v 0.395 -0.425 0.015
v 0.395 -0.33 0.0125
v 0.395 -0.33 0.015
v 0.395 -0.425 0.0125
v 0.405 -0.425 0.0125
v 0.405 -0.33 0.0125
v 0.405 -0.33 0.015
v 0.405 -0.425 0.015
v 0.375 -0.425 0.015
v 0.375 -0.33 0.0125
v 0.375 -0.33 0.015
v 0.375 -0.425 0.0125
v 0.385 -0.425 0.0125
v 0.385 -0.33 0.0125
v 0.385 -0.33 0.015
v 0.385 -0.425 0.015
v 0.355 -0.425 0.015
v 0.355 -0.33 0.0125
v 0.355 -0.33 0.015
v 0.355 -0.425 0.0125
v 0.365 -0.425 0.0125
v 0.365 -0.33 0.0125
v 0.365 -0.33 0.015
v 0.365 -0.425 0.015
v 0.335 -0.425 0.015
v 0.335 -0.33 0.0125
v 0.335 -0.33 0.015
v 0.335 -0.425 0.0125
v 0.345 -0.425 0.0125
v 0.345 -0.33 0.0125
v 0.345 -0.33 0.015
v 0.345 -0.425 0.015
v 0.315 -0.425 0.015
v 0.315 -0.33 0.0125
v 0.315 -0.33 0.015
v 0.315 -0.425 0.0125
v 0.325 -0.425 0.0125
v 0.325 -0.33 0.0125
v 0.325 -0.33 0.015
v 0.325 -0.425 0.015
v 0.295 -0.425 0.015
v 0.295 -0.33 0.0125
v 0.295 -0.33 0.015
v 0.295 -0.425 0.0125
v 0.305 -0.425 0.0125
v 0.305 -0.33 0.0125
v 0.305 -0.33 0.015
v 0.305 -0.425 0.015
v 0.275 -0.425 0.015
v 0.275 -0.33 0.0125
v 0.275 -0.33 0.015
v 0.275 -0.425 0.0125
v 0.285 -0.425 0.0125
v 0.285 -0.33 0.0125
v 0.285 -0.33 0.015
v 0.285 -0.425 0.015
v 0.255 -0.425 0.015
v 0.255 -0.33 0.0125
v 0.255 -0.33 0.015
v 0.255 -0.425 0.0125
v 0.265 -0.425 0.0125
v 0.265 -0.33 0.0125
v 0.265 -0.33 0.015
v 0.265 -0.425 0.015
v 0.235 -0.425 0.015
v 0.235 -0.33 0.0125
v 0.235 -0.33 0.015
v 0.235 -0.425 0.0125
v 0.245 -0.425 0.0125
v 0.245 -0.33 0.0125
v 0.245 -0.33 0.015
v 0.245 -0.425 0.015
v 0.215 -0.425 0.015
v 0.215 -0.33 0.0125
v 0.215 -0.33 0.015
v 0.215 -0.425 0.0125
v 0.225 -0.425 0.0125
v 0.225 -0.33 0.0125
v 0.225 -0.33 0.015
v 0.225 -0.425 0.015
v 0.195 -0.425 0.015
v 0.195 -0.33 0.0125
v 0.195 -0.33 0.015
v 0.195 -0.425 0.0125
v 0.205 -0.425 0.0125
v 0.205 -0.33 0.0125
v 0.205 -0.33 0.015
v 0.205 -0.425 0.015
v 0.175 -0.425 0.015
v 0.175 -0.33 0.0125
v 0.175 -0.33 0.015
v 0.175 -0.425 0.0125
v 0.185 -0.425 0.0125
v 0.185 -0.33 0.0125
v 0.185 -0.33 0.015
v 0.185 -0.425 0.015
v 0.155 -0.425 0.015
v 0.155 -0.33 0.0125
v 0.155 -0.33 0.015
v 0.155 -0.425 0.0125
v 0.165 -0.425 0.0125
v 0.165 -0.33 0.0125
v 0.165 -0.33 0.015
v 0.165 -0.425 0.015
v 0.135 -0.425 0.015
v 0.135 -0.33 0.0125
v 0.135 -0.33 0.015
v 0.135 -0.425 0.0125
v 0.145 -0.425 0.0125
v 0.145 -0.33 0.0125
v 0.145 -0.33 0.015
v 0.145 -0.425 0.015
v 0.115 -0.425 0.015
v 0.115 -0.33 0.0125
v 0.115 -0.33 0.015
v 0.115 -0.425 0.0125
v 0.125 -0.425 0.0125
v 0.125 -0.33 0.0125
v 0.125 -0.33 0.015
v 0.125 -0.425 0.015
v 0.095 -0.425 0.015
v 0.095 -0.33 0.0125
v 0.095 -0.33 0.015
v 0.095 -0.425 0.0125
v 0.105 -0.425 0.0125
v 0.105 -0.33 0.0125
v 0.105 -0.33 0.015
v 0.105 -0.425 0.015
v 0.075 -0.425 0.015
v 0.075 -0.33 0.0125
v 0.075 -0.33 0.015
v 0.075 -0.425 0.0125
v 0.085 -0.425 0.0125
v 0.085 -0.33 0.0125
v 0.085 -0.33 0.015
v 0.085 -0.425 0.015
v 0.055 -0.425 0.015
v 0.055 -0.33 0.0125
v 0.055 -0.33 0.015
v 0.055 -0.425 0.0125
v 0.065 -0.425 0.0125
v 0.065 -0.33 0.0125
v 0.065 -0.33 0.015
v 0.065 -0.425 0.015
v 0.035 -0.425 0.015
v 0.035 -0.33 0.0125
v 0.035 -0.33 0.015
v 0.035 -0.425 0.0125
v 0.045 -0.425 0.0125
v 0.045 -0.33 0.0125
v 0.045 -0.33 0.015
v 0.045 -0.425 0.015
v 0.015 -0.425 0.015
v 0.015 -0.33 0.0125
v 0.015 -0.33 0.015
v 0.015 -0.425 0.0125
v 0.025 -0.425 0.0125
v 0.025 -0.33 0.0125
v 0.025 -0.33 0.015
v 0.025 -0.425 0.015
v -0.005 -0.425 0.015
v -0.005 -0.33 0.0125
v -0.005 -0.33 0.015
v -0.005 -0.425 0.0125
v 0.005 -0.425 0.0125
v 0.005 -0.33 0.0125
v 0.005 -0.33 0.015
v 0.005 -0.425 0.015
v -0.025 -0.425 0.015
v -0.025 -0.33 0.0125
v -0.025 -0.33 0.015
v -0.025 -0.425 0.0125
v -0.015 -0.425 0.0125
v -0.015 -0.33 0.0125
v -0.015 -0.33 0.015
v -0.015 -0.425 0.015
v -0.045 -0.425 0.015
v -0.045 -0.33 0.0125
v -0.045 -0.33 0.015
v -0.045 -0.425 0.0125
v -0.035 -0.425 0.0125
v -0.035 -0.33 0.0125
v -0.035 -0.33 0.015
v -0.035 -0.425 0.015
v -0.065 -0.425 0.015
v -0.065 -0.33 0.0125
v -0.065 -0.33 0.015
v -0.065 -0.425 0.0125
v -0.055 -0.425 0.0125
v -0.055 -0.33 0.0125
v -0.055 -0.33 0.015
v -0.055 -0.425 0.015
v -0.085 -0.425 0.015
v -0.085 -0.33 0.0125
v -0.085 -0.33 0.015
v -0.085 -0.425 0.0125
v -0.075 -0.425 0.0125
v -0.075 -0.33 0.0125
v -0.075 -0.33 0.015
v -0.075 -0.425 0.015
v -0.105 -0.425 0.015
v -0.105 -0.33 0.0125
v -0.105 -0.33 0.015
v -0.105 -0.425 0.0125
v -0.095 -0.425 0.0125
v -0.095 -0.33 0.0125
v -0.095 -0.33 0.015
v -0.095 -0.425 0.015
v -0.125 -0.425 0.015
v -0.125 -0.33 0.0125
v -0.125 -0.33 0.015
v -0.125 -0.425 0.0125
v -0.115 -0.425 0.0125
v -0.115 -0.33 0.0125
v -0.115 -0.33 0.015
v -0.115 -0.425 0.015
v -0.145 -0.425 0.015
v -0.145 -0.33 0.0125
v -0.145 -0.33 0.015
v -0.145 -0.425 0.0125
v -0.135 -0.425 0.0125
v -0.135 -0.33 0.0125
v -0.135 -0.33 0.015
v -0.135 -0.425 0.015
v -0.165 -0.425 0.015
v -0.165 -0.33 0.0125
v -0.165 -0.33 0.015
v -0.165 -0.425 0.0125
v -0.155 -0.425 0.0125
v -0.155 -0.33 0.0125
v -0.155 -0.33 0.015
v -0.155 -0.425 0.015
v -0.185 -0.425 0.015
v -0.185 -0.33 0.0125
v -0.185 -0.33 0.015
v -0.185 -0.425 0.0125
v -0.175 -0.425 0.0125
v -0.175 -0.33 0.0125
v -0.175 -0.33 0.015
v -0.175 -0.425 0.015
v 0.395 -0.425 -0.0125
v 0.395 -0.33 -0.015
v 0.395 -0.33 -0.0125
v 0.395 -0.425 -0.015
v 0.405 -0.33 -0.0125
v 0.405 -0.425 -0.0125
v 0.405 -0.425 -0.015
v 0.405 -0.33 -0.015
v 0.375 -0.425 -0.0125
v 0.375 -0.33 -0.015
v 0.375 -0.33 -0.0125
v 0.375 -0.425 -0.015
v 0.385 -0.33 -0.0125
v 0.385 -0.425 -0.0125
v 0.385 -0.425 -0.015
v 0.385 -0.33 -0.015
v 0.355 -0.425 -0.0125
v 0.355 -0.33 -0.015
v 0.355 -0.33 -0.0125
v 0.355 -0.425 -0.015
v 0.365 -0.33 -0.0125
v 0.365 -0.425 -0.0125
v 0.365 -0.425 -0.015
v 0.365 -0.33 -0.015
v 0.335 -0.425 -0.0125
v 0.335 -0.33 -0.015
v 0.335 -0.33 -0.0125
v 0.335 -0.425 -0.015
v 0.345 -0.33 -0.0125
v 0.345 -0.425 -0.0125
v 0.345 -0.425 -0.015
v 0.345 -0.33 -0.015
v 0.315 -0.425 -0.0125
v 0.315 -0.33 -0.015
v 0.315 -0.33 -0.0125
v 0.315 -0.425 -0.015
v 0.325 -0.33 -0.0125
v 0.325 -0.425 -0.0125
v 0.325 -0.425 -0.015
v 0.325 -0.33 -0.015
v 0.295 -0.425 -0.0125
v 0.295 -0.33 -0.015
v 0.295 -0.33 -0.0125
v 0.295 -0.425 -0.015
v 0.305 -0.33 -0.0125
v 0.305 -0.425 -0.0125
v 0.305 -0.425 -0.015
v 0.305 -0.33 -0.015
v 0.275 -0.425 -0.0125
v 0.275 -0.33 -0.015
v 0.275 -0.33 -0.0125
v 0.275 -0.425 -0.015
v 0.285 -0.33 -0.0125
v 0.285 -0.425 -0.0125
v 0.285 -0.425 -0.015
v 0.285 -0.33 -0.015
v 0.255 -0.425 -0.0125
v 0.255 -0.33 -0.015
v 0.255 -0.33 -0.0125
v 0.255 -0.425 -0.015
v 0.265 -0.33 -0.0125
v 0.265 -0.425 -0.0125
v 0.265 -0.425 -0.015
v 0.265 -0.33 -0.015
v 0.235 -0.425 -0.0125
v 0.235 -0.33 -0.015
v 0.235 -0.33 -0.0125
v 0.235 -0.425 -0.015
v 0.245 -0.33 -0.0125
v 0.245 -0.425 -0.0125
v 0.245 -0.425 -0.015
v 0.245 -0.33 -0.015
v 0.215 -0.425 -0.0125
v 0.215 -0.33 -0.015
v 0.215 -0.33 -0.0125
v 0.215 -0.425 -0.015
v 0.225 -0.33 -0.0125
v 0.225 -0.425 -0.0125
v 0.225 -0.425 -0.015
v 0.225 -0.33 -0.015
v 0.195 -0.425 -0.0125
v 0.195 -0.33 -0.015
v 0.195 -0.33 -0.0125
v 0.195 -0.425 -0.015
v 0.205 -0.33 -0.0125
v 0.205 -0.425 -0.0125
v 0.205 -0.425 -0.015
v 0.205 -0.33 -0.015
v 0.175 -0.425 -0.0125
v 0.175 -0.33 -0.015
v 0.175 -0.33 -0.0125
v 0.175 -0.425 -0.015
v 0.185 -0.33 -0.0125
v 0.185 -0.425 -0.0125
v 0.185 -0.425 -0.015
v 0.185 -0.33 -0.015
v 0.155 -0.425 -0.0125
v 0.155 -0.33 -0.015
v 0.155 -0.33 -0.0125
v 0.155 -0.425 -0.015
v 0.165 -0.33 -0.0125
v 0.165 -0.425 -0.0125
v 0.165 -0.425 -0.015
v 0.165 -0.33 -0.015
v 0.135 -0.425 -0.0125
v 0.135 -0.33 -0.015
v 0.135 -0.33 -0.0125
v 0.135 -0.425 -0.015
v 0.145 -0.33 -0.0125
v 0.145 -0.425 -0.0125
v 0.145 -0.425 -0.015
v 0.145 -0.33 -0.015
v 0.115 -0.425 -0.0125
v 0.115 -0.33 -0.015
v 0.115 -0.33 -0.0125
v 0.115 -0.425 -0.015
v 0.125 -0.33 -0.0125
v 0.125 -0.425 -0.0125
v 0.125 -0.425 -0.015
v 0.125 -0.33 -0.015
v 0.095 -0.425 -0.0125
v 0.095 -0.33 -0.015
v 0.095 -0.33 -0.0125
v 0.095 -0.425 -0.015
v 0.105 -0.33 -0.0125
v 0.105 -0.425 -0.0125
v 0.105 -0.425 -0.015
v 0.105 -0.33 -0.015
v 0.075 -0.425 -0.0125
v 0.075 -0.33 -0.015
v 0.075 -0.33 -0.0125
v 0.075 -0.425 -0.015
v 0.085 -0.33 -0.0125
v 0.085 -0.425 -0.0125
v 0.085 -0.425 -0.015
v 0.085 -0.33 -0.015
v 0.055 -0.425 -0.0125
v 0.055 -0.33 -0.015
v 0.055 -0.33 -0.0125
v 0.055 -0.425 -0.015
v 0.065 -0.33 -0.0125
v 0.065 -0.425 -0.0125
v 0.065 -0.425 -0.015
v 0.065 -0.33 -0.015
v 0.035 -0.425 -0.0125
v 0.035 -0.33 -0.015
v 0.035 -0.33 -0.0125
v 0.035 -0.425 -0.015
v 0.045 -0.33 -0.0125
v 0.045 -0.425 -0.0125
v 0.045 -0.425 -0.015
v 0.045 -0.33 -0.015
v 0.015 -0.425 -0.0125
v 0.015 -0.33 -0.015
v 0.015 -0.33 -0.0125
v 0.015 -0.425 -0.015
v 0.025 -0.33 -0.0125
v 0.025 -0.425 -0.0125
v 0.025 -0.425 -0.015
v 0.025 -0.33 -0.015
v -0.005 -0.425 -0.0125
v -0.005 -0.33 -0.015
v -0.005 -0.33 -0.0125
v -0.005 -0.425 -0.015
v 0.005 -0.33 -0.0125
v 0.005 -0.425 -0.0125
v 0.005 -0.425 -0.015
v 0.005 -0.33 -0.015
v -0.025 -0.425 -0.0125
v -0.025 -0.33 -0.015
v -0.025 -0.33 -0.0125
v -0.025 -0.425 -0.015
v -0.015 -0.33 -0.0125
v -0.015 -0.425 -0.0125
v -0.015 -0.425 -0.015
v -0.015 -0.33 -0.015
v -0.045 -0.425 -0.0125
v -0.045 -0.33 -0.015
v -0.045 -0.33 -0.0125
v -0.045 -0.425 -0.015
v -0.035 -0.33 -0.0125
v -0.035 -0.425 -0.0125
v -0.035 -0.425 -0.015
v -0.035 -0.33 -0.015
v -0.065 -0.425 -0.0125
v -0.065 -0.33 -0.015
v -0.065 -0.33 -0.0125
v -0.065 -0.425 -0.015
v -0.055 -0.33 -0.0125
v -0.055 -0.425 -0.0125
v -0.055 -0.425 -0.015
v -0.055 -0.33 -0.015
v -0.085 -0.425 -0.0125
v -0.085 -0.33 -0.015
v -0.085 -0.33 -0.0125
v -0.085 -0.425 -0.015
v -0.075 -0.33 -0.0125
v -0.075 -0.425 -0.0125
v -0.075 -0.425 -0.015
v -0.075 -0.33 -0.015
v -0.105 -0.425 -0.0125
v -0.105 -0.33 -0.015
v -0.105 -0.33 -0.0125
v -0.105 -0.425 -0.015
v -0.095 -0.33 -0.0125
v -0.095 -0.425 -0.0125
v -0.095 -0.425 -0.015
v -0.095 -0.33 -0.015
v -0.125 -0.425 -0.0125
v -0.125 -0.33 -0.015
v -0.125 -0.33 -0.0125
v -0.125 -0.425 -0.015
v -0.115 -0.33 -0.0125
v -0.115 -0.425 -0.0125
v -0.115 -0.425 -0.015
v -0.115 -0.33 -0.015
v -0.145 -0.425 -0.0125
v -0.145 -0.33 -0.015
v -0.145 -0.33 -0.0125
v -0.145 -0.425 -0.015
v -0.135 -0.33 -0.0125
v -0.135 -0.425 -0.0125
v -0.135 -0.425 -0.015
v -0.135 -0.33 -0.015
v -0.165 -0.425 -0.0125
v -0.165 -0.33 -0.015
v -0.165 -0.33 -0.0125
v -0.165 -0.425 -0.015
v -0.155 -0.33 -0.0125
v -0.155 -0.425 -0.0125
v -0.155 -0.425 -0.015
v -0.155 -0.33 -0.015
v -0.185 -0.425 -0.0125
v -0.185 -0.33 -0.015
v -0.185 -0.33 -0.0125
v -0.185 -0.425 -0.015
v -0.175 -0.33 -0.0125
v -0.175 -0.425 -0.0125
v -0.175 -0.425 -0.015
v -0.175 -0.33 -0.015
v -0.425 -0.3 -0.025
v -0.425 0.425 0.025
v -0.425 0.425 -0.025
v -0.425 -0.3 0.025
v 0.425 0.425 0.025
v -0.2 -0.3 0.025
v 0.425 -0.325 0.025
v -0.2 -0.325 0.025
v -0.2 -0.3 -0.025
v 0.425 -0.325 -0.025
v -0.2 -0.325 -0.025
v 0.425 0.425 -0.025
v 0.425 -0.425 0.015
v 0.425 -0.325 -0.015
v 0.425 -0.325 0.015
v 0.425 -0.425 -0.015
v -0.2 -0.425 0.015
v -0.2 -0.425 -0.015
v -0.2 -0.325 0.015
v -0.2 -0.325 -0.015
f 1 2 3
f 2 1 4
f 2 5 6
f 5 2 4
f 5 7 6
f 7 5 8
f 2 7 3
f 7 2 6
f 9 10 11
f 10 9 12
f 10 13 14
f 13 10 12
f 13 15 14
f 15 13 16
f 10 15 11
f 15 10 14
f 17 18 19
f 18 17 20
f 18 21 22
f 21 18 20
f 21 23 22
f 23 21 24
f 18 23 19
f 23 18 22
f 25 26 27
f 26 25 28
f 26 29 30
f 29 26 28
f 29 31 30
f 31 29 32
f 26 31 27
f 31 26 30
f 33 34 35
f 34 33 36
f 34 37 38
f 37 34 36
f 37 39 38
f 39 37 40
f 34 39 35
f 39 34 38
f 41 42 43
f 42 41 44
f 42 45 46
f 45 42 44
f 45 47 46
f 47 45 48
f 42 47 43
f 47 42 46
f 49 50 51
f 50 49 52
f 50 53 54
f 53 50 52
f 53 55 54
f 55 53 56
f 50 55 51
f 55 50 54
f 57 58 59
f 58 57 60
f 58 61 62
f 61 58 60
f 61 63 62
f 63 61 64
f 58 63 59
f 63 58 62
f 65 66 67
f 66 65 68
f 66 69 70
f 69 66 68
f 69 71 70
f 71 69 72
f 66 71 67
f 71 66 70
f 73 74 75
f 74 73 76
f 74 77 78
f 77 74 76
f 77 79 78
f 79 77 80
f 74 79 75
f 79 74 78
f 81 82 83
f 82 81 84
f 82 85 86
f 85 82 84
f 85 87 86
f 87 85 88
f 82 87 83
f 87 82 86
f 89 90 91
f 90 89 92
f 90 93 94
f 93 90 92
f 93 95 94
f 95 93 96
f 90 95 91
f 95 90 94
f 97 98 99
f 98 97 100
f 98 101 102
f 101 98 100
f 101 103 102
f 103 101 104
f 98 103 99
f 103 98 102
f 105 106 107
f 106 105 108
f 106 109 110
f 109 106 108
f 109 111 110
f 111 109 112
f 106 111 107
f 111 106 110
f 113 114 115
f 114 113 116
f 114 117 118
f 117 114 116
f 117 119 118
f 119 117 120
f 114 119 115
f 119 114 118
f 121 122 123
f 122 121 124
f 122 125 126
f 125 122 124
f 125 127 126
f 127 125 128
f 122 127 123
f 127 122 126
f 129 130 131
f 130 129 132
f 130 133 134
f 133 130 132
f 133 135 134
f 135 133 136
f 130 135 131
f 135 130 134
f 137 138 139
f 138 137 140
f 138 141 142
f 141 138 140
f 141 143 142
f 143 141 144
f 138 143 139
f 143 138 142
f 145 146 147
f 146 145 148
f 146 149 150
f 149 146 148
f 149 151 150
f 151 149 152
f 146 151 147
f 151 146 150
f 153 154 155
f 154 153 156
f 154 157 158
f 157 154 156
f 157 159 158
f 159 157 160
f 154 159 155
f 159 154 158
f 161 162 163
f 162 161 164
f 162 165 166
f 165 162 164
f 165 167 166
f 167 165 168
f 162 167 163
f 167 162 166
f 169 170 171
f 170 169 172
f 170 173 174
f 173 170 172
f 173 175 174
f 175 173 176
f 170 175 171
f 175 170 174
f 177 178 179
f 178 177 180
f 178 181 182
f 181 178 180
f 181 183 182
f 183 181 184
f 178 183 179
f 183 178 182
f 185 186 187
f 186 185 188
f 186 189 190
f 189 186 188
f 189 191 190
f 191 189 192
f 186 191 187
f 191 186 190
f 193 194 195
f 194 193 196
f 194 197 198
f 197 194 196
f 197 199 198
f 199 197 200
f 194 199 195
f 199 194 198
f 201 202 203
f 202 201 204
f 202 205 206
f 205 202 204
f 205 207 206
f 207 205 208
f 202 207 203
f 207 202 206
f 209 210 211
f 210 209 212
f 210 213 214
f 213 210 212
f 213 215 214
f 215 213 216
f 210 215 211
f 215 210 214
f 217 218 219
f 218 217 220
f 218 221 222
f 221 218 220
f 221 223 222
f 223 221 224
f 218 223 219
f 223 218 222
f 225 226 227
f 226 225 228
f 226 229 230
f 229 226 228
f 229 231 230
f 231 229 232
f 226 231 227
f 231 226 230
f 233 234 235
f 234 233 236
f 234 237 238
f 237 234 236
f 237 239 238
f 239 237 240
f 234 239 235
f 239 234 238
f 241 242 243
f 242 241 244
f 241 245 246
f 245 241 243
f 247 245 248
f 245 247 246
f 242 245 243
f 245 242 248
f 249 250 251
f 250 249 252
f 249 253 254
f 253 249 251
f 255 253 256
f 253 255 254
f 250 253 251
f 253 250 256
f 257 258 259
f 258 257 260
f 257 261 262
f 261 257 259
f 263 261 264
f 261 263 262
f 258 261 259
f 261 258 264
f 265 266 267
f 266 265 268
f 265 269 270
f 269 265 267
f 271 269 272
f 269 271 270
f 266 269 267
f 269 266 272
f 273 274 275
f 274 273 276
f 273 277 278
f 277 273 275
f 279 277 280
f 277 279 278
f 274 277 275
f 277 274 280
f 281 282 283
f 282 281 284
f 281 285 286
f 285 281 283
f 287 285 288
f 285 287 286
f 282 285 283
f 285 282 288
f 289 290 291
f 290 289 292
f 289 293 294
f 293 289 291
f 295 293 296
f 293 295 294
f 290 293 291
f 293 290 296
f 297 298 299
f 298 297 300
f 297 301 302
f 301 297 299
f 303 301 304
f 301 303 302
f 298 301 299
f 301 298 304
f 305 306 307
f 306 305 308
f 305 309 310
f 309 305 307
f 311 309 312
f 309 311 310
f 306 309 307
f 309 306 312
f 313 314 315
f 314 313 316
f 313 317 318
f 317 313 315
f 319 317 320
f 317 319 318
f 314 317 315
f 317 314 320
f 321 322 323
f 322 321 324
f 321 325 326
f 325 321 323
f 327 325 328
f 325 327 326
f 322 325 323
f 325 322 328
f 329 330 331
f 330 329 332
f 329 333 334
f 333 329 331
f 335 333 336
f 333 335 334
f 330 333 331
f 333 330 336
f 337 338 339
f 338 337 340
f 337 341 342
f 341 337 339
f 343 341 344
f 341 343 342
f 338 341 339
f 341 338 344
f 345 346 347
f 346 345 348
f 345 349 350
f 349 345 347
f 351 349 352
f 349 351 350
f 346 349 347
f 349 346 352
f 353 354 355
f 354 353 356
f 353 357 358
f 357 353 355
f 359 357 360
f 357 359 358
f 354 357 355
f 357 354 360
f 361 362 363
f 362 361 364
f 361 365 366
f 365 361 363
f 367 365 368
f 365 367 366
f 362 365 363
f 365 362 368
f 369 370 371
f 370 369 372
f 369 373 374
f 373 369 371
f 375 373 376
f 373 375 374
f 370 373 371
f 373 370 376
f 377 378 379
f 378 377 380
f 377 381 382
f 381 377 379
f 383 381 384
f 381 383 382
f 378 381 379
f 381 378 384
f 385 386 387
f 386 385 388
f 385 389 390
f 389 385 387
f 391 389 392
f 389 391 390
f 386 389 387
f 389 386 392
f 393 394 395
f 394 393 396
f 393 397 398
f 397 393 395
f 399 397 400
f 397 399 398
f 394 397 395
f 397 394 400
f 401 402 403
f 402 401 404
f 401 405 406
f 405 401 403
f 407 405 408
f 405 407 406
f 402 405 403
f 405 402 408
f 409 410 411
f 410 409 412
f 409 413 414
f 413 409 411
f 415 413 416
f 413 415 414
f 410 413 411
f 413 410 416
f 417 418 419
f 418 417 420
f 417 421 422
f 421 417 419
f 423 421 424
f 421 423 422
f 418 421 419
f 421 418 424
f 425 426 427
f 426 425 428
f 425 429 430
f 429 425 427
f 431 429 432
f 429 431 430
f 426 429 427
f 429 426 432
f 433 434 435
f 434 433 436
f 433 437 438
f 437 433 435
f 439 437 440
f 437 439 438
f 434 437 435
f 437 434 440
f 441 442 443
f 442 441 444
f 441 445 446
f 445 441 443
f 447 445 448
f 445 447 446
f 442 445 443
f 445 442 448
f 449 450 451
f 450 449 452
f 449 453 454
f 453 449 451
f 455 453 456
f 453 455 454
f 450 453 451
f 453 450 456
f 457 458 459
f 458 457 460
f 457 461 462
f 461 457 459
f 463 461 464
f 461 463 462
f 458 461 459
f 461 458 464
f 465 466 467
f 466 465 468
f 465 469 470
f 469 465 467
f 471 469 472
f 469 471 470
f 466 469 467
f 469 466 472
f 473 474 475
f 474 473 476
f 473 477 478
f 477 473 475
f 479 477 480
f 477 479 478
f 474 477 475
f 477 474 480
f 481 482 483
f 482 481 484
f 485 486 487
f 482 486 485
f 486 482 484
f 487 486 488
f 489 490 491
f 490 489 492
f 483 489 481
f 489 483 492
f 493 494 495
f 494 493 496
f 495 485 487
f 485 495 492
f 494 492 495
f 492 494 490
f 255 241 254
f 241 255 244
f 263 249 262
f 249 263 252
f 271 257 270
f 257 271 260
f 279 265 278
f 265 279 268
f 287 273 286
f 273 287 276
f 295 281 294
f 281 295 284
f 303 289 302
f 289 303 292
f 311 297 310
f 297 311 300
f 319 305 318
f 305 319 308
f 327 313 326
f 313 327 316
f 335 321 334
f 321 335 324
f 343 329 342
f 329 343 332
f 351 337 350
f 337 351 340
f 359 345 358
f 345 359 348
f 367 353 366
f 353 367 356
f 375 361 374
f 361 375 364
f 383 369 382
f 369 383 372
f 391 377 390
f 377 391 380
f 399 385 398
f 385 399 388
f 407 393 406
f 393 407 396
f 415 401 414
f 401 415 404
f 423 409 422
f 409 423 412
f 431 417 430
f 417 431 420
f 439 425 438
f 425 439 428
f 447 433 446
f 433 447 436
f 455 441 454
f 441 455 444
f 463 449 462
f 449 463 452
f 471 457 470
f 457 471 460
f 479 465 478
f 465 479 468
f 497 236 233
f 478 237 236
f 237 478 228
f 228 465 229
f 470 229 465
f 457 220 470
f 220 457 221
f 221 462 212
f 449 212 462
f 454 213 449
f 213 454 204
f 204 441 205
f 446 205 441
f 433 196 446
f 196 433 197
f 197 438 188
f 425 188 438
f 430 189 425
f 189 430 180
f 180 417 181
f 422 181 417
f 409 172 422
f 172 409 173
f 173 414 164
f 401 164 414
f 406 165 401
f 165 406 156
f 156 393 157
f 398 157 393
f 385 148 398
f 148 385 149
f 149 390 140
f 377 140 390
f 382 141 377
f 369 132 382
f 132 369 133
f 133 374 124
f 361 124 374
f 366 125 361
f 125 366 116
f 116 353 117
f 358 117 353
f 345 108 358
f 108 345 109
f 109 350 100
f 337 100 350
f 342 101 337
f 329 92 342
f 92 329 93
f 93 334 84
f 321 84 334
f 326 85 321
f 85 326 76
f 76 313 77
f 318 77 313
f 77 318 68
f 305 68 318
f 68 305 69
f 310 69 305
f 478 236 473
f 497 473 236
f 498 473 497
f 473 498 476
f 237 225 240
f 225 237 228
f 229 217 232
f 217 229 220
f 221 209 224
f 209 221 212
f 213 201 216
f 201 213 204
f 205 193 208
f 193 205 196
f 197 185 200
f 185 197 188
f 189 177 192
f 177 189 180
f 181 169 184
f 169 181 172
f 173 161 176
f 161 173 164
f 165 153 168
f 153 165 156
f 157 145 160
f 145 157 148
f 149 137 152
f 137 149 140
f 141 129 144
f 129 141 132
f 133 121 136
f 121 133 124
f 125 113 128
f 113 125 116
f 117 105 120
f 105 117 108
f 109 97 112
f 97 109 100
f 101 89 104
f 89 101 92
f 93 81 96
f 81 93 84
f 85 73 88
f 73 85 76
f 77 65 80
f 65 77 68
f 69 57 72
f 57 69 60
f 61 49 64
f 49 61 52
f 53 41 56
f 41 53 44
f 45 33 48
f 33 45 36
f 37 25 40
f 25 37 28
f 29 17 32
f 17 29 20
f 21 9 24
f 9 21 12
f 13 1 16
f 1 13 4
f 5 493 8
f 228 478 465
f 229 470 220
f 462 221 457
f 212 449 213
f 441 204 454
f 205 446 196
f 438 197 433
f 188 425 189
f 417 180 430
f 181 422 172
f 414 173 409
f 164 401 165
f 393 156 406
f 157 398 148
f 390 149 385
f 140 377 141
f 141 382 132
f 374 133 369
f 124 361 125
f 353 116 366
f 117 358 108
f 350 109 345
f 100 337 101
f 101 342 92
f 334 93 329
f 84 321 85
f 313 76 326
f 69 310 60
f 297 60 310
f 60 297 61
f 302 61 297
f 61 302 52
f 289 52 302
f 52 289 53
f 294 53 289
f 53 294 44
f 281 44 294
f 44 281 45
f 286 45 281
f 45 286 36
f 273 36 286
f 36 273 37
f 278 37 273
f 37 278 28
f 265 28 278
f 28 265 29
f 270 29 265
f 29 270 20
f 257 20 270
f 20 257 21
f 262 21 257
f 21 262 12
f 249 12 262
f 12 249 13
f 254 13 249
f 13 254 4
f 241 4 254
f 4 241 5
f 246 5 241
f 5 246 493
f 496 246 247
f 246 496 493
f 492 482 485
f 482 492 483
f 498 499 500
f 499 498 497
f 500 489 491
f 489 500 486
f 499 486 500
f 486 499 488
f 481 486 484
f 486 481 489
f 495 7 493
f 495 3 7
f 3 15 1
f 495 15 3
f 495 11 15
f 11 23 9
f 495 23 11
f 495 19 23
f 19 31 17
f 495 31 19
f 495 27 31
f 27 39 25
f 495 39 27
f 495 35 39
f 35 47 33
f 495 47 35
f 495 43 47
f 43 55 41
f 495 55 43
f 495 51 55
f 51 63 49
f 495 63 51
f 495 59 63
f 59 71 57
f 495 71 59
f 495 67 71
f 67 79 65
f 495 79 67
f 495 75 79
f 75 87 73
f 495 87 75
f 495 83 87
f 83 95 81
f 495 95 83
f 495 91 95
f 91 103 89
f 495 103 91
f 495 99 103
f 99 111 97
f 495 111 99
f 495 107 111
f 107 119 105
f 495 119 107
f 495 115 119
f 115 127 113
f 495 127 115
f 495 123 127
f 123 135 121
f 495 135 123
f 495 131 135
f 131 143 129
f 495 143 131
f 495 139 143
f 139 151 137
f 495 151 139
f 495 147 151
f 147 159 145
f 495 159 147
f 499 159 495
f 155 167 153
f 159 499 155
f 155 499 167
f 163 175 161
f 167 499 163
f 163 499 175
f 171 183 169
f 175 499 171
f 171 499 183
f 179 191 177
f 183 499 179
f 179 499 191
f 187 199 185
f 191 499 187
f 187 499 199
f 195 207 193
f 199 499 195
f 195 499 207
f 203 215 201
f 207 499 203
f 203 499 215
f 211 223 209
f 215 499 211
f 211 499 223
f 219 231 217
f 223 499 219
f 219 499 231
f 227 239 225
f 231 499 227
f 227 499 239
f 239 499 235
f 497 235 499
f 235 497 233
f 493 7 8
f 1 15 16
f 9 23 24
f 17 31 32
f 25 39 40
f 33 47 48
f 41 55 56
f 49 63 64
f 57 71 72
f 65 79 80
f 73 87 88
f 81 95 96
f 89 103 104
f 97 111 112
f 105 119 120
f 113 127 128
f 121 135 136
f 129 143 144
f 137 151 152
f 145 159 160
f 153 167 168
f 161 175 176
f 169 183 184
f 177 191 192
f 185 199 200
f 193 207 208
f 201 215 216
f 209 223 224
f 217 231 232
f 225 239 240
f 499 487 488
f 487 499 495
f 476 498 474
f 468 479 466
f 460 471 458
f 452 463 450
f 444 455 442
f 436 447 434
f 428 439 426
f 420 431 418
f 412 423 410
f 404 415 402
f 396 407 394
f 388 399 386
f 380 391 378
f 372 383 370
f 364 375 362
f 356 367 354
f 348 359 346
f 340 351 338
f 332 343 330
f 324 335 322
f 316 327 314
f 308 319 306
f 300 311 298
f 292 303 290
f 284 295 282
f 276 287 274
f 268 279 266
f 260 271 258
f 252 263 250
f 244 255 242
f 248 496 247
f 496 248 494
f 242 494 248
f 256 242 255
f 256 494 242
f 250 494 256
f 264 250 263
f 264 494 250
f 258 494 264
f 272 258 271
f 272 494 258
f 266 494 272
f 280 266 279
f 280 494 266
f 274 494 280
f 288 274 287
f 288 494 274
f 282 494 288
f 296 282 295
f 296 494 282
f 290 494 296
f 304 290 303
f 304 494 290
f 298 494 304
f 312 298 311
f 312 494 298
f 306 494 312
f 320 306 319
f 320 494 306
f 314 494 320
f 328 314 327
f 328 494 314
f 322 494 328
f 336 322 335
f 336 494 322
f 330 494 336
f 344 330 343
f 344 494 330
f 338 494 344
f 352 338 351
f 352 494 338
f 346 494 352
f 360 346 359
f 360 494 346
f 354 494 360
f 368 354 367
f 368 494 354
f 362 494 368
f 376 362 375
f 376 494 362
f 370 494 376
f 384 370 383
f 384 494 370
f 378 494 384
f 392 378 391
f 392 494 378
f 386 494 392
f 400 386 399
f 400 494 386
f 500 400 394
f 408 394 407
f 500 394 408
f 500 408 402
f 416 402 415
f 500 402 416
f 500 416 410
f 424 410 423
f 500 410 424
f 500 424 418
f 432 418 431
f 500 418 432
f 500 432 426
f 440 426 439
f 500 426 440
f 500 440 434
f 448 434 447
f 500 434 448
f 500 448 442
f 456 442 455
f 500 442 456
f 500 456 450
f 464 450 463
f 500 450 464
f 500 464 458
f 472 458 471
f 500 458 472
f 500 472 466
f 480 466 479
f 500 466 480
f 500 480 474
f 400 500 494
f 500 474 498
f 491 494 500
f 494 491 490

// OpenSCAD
use <lib.scad>

module boardHD() {
	rotate([0,0,180]) difference() {
		box([0.85, 0.85, 0.05]);
		translate([0.35,0.45,0]) box([0.3, 0.3, 0.1]);
		translate([-0.1,0.75,0.04]) box([0.85, 0.85, 0.05]);
		translate([-0.1,0.75,-0.04]) box([0.85, 0.85, 0.05]);
		for (i = [-20:9])
			translate([i*0.02,0.38,0.0175]) box([0.01, 0.1, 0.01]);
		for (i = [-20:9])
			translate([i*0.02,0.38,-0.0175]) box([0.01, 0.1, 0.01]);
	}
}

module boardLD() {
	rotate([0,0,180]) difference() {
		box([0.85, 0.85, 0.05]);
		translate([0.35,0.45,0]) box([0.3, 0.3, 0.1]);
	}
}

boardHD();
